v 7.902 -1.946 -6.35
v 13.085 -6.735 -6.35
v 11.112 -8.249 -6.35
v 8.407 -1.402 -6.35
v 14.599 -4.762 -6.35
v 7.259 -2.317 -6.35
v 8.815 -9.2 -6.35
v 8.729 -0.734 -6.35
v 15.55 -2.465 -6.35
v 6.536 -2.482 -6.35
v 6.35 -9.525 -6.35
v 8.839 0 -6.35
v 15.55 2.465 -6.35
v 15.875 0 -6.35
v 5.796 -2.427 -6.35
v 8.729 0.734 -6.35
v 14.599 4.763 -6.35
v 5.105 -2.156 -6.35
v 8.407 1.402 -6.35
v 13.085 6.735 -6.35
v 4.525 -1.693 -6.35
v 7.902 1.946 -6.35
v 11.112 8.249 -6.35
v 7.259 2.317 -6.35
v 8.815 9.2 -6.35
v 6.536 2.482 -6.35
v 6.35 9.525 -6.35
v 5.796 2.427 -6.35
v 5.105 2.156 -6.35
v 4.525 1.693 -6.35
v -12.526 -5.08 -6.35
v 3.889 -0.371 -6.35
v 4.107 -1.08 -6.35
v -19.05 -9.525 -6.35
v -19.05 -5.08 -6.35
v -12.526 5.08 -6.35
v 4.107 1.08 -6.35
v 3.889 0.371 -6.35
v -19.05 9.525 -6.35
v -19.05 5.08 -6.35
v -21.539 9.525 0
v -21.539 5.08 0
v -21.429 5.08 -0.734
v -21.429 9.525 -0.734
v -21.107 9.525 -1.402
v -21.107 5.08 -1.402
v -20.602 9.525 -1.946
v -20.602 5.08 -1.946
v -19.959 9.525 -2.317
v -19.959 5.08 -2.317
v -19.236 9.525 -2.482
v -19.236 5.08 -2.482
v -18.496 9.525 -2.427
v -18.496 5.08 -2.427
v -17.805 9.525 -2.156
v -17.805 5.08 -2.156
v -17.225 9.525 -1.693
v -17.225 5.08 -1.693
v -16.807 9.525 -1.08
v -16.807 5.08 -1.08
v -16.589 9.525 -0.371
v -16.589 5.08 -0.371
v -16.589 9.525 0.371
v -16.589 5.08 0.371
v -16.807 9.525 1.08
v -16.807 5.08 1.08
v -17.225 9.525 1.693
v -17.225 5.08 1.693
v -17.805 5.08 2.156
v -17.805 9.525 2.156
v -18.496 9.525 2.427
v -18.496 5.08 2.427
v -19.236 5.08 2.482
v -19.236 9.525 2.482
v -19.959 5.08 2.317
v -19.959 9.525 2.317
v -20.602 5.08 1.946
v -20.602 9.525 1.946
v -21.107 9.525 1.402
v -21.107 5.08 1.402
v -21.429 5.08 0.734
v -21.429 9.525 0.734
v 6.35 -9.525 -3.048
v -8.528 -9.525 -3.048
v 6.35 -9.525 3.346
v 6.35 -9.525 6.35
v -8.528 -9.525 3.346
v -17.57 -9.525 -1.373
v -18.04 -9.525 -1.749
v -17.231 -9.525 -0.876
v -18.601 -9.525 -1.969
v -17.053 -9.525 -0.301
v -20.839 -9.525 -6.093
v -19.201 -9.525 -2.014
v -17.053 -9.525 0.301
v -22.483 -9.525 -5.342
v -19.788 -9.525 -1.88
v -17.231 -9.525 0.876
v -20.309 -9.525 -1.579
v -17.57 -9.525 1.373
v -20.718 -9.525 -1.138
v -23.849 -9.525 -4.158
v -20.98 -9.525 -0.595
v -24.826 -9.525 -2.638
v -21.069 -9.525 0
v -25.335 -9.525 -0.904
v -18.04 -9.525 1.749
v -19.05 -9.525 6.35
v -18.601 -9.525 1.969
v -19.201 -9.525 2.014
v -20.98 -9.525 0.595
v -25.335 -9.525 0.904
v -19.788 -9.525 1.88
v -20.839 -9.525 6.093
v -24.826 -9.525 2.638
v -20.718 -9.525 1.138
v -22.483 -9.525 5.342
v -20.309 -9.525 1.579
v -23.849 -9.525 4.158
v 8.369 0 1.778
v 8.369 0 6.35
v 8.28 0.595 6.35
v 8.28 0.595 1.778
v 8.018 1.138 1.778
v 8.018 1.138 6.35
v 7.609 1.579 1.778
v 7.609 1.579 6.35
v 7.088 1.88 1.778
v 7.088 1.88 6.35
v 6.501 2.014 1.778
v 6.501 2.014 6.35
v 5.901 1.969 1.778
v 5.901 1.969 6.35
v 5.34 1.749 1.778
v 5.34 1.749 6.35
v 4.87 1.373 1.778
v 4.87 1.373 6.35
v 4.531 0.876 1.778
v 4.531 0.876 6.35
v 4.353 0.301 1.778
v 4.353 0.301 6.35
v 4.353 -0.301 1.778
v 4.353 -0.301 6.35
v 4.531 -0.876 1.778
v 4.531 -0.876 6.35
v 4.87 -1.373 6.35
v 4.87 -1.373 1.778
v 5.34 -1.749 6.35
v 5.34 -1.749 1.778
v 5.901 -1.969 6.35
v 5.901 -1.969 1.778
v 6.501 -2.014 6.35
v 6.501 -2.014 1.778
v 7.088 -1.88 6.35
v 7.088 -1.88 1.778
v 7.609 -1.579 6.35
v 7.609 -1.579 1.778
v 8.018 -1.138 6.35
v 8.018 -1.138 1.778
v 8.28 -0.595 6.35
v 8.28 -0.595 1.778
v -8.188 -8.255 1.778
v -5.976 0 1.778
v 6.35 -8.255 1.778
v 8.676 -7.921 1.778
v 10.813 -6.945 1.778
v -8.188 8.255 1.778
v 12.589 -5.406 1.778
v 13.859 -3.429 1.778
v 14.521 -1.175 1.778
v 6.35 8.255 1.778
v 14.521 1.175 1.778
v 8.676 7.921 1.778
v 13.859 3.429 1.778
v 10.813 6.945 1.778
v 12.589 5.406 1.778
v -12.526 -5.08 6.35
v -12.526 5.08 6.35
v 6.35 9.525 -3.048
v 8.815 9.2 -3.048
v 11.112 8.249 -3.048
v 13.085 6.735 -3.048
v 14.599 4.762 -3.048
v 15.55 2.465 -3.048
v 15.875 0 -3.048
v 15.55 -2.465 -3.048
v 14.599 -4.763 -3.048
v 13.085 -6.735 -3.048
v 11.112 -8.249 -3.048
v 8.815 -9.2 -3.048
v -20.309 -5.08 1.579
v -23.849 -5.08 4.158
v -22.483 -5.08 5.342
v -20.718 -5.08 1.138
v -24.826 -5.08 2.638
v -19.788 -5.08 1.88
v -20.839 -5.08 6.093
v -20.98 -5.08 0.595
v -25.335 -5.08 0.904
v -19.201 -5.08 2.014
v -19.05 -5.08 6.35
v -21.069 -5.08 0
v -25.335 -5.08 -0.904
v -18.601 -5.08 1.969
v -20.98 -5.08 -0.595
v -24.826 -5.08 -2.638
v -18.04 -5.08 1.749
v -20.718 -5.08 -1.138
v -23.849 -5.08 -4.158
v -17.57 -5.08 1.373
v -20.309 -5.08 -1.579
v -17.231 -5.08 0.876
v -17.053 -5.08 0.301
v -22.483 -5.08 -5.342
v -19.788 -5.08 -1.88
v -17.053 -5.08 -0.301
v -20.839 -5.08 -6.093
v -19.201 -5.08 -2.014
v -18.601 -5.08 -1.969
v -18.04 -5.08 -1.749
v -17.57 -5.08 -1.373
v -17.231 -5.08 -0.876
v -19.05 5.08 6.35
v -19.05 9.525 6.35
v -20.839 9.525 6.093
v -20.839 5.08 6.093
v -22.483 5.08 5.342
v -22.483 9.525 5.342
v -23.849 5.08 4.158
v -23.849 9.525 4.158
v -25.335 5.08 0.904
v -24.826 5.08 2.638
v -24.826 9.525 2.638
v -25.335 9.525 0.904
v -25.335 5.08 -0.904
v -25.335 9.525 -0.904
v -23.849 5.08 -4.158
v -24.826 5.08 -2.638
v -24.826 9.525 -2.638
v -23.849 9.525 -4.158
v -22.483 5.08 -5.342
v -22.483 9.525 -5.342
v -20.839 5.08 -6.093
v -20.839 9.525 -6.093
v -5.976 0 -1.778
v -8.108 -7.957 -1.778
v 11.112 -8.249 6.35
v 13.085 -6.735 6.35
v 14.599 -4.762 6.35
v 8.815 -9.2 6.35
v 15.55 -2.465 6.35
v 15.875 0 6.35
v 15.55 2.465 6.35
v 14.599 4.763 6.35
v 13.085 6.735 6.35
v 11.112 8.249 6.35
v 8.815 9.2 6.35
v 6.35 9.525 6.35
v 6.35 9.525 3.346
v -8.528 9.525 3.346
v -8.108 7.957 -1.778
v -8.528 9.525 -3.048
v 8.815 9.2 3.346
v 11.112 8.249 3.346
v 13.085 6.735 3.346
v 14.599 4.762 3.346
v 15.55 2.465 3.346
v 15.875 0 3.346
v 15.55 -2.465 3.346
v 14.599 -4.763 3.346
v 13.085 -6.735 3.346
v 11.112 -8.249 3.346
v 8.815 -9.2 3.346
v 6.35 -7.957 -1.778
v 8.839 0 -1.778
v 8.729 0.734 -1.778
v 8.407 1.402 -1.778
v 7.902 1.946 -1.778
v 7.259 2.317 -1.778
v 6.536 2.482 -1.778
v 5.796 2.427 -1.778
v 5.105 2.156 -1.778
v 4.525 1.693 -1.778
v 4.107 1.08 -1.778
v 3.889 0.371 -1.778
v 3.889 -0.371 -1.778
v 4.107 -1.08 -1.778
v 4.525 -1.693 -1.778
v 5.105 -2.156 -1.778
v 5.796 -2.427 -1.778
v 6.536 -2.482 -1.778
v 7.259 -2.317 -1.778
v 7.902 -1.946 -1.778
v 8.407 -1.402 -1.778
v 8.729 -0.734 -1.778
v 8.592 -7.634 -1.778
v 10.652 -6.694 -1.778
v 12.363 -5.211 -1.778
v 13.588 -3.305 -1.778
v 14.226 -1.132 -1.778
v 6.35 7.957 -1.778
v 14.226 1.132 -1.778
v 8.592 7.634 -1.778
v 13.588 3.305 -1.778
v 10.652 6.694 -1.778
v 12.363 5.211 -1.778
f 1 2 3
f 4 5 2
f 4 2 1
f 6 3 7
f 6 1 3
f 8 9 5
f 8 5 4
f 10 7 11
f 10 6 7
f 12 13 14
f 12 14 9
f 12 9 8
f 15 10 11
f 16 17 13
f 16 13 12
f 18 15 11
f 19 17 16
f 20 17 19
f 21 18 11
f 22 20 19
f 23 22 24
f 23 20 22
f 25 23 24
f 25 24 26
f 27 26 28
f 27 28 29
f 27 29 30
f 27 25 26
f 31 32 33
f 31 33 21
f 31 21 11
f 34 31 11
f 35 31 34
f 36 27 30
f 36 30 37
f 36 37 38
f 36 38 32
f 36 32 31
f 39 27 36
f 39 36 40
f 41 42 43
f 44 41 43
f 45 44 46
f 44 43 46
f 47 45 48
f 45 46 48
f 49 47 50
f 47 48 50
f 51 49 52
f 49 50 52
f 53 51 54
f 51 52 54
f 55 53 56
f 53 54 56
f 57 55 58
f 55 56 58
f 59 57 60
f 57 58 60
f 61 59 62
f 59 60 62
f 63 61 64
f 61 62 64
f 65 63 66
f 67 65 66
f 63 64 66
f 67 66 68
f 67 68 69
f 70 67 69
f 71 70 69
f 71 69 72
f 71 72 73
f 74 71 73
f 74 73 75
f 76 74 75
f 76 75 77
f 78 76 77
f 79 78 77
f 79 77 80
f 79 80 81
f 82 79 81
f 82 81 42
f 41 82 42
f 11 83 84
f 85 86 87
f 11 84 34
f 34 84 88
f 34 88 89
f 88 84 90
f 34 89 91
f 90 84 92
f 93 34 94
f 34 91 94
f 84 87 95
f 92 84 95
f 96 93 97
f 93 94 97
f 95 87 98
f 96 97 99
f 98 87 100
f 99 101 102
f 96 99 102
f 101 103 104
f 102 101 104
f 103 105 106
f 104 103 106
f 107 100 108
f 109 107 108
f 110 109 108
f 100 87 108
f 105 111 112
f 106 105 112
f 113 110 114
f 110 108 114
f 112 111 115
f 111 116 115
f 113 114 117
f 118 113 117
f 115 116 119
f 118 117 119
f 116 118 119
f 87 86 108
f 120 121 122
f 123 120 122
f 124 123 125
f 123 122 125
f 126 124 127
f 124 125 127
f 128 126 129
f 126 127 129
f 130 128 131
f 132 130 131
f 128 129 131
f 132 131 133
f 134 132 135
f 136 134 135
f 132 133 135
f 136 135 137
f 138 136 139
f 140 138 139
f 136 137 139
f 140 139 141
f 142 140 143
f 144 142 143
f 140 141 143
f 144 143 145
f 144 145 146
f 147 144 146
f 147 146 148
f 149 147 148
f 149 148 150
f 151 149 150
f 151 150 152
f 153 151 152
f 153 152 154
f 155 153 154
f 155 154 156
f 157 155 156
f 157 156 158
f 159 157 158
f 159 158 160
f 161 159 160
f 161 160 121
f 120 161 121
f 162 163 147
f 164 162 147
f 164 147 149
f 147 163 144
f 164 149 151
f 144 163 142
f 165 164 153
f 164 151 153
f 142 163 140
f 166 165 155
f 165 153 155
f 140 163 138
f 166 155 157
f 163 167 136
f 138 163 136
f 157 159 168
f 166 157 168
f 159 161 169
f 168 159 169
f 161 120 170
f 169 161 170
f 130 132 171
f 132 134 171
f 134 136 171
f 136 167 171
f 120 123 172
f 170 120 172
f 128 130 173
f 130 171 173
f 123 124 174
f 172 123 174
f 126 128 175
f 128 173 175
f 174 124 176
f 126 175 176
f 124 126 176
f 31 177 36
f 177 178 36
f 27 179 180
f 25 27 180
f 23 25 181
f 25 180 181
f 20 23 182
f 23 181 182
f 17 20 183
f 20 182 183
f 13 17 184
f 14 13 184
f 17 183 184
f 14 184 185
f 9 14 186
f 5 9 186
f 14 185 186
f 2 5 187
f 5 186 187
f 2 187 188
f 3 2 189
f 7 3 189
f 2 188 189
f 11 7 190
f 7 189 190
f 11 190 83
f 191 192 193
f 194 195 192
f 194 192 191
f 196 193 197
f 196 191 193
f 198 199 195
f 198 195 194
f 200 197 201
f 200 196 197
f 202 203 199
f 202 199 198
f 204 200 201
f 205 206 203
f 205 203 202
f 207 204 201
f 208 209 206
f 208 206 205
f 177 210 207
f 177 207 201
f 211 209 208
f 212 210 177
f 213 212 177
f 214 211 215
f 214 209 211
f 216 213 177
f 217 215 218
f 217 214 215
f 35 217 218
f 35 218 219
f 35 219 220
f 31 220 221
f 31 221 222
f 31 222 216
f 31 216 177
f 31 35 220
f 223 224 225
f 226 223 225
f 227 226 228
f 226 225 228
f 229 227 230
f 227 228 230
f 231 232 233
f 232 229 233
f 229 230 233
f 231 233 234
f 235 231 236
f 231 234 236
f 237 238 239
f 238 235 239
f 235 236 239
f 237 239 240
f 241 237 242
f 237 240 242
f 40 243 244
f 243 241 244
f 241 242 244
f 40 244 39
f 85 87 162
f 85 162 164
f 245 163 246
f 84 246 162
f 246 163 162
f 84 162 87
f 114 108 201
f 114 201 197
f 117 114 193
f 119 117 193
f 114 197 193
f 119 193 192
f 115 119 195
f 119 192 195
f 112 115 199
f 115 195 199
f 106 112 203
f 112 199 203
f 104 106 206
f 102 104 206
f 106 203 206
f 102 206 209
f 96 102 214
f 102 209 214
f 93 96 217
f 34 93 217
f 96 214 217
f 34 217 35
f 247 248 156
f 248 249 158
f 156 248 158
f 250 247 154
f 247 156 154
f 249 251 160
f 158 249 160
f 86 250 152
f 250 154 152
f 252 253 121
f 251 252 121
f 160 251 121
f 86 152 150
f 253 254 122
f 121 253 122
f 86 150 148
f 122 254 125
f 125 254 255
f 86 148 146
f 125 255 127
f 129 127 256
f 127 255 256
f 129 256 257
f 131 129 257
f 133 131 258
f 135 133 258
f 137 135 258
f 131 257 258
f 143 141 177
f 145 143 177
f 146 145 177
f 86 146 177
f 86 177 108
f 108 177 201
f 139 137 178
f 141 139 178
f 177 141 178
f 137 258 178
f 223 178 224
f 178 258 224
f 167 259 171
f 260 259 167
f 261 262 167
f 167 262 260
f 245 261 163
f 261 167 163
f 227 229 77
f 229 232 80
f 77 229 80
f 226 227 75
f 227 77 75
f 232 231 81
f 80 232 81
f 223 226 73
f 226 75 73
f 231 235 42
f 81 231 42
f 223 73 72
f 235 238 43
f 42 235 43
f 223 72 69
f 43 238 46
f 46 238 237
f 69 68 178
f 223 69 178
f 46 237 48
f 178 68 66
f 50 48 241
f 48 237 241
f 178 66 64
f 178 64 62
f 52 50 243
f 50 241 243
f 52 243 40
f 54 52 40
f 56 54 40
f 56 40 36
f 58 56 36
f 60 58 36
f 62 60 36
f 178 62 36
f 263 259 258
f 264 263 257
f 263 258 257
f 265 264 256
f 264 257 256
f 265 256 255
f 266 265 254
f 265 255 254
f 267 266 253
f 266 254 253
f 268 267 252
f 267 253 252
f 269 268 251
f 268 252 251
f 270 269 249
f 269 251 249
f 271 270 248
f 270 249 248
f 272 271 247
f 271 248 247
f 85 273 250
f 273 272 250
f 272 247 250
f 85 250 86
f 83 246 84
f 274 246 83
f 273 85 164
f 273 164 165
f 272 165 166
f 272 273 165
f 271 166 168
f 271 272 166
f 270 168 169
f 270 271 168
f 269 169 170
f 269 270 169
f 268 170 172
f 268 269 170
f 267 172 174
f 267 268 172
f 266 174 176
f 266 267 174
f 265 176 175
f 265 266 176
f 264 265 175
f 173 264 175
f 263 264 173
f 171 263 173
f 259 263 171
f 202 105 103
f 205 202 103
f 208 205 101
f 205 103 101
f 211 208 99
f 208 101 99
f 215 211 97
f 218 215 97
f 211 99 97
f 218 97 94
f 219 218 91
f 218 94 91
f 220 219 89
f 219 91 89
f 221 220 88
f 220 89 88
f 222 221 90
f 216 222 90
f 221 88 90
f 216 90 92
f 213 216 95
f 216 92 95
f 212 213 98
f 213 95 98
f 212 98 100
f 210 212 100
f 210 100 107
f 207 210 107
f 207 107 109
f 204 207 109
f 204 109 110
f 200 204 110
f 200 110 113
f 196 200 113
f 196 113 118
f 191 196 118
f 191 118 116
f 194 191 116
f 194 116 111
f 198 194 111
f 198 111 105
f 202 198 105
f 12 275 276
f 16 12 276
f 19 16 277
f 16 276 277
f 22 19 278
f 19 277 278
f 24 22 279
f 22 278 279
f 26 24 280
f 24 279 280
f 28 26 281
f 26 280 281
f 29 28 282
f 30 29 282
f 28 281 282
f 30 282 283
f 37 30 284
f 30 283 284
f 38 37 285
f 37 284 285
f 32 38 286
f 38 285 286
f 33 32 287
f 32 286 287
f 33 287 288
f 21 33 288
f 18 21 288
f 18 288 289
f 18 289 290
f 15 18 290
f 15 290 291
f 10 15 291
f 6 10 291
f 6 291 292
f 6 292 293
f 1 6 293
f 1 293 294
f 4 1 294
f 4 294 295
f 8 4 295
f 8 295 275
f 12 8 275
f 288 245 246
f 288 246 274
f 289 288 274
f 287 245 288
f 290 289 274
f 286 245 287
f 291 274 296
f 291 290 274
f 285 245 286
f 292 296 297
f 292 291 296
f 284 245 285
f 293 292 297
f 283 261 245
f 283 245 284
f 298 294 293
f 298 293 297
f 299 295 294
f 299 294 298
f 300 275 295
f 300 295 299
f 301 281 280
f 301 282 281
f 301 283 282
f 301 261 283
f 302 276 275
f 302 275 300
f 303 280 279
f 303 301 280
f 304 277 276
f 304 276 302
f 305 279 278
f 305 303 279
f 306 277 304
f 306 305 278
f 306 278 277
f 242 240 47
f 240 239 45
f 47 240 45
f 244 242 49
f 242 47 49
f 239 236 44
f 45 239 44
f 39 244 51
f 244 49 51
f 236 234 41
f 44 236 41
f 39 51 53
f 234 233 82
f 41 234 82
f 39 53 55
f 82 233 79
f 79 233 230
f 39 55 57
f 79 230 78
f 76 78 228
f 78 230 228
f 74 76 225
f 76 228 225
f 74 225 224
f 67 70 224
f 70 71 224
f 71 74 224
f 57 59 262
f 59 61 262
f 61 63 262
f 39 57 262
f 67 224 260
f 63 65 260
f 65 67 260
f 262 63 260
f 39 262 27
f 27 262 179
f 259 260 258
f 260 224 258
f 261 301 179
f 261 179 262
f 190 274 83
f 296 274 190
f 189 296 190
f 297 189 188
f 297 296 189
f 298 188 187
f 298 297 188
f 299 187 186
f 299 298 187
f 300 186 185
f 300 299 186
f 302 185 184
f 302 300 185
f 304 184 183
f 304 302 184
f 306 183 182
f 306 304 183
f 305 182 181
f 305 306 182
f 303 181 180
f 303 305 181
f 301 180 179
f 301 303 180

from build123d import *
from OCP.BRepFilletAPI import BRepFilletAPI_MakeChamfer

# Parameters (mm, degrees)
BOSS_EXTRUDE1_DEPTH        = 9.525
BOSS_EXTRUDE2_DEPTH        = 12.7
CUT_EXTRUDE1_DEPTH         = 5.08
F_10_32_TAPPED_HOLE1_D     = 4.0386
F_10_32_TAPPED_HOLE1_DEPTH = 4.445
F_10_CLEARANCE_HOLE1_D     = 4.9784
F_10_CLEARANCE_HOLE1_DEPTH = 14.604
CUT_EXTRUDE2_DEPTH         = 1.778
F_10_CLEARANCE_HOLE2_D     = 4.9784
F_10_CLEARANCE_HOLE2_DEPTH = 8.127
F_10_32_TAPPED_HOLE2_D     = 4.0386
CHAMFER1_SIZE              = 1.27
CHAMFER1_SIZE2             = 1.568319389


with BuildPart() as part:
    # Sketch1 → Boss-Extrude1 (new, symmetric)
    with BuildSketch(Plane(origin=(0, 0, 0), x_dir=(1, 0, 0), z_dir=(0, 1, 0))):
        with BuildLine():
            Line((0, -6.35), (-19.05, -6.35))
            ThreePointArc((-19.05, -6.35), (-25.4, 0), (-19.05, 6.35))
            Line((-19.05, 6.35), (0, 6.35))
            Line((0, 6.35), (0, -6.35))
        make_face()
    extrude(amount=BOSS_EXTRUDE1_DEPTH, both=True)

    # Sketch2 → Boss-Extrude2 (add)
    with BuildSketch(Plane.XY.offset(6.35)):
        with BuildLine():
            Line((0, 9.525), (6.35, 9.525))
            ThreePointArc((6.35, 9.525), (15.875, 0), (6.35, -9.525))
            Line((6.35, -9.525), (0, -9.525))
            ThreePointArc((0, -9.525), (-9.525, 0), (0, 9.525))
        make_face()
    extrude(amount=-BOSS_EXTRUDE2_DEPTH)

    # Sketch3 → Cut-Extrude1 (cut, symmetric)
    with BuildSketch(Plane(origin=(0, 0, 0), x_dir=(1, 0, 0), z_dir=(0, 1, 0))):
        with BuildLine():
            Line((-12.526499966, 6.35), (-19.05, 6.35))
            ThreePointArc((-19.05, 6.35), (-25.4, 0), (-19.05, -6.35))
            Line((-19.05, -6.35), (-12.526499966, -6.35))
            Line((-12.526499966, -6.35), (-12.526499966, 6.35))
        make_face()
    extrude(amount=CUT_EXTRUDE1_DEPTH, both=True, mode=Mode.SUBTRACT)

    # #10-32 Tapped Hole1
    with Locations(Plane(origin=(0, -5.08, 0), x_dir=(1, 0, 0), z_dir=(0, 1, 0))):
        with Locations((-19.05, 0)):
            Hole(F_10_32_TAPPED_HOLE1_D / 2, depth=F_10_32_TAPPED_HOLE1_DEPTH)

    # #10 Clearance Hole1
    with Locations(Plane(origin=(0, 9.525, 0), x_dir=(1, 0, 0), z_dir=(0, 1, 0))):
        with Locations((-19.05, 0)):
            Hole(F_10_CLEARANCE_HOLE1_D / 2, depth=F_10_CLEARANCE_HOLE1_DEPTH)

    # Sketch9 → Cut-Extrude2 (cut, symmetric)
    with BuildSketch(Plane.XY):
        with BuildLine():
            Line((-5.976257023, 0), (-8.528473081, -9.525))
            Line((-8.528473081, -9.525), (6.35, -9.525))
            ThreePointArc((6.35, -9.525), (15.875, 0), (6.35, 9.525))
            Line((6.35, 9.525), (-8.528473081, 9.525))
            Line((-8.528473081, 9.525), (-5.976257023, 0))
        make_face()
    extrude(amount=CUT_EXTRUDE2_DEPTH, both=True, mode=Mode.SUBTRACT)

    # #10 Clearance Hole2
    with Locations(Plane(origin=(0, 0, -6.35), x_dir=(-1, 0, 0), z_dir=(0, 0, -1))):
        with Locations((-6.35, 0)):
            Hole(F_10_CLEARANCE_HOLE2_D / 2, depth=F_10_CLEARANCE_HOLE2_DEPTH)

    # #10-32 Tapped Hole2 (through all)
    with Locations(Plane(origin=(0, 0, 1.778), x_dir=(-1, 0, 0), z_dir=(0, 0, -1))):
        with Locations((-6.35, 0)):
            Hole(F_10_32_TAPPED_HOLE2_D / 2)

    # Chamfer1: one chamfer whose edges measure the first distance from different faces: ONE call of the kernel's chamfer builder (chamfer() names one face for all edges)
    chamfer1_edges_1 = [part.edges().sort_by_distance(p)[0] for p in [
        (-1.08923654, -9.525, -1.778),
    ]]
    chamfer1_side_1 = [part.faces().sort_by_distance(p)[0] for p in [
        (-9.756442015, -9.525, 0),
    ]]
    chamfer1_edges_2 = [part.edges().sort_by_distance(p)[0] for p in [
        (15.875, 0, -1.778),
    ]]
    chamfer1_side_2 = [part.faces().sort_by_distance(p)[0] for p in [
        (15.875, 0, -4.064),
    ]]
    chamfer1_edges_3 = [part.edges().sort_by_distance(p)[0] for p in [
        (-1.08923654, 9.525, -1.778),
    ]]
    chamfer1_side_3 = [part.faces().sort_by_distance(p)[0] for p in [
        (-9.559168107, 9.525, 0),
    ]]
    chamfer1_edges_4 = [part.edges().sort_by_distance(p)[0] for p in [
        (-1.08923654, -9.525, 1.778),
        (15.875, 0, 1.778),
        (-1.08923654, 9.525, 1.778),
    ]]
    chamfer1_side_4 = [part.faces().sort_by_distance(p)[0] for p in [
        (3.285858214, 0, 1.778),
    ]]
    chamfer1 = BRepFilletAPI_MakeChamfer(part.part.solid().wrapped)
    for e in chamfer1_edges_1:
        chamfer1.Add(CHAMFER1_SIZE, CHAMFER1_SIZE2, e.wrapped, chamfer1_side_1[0].wrapped)  # the first distance lies on this face
    for e in chamfer1_edges_2:
        chamfer1.Add(CHAMFER1_SIZE, CHAMFER1_SIZE2, e.wrapped, chamfer1_side_2[0].wrapped)  # the first distance lies on this face
    for e in chamfer1_edges_3:
        chamfer1.Add(CHAMFER1_SIZE, CHAMFER1_SIZE2, e.wrapped, chamfer1_side_3[0].wrapped)  # the first distance lies on this face
    for e in chamfer1_edges_4:
        chamfer1.Add(CHAMFER1_SIZE, CHAMFER1_SIZE2, e.wrapped, chamfer1_side_4[0].wrapped)  # the first distance lies on this face
    add(Compound.cast(chamfer1.Shape()), mode=Mode.REPLACE)


solid = part.part
